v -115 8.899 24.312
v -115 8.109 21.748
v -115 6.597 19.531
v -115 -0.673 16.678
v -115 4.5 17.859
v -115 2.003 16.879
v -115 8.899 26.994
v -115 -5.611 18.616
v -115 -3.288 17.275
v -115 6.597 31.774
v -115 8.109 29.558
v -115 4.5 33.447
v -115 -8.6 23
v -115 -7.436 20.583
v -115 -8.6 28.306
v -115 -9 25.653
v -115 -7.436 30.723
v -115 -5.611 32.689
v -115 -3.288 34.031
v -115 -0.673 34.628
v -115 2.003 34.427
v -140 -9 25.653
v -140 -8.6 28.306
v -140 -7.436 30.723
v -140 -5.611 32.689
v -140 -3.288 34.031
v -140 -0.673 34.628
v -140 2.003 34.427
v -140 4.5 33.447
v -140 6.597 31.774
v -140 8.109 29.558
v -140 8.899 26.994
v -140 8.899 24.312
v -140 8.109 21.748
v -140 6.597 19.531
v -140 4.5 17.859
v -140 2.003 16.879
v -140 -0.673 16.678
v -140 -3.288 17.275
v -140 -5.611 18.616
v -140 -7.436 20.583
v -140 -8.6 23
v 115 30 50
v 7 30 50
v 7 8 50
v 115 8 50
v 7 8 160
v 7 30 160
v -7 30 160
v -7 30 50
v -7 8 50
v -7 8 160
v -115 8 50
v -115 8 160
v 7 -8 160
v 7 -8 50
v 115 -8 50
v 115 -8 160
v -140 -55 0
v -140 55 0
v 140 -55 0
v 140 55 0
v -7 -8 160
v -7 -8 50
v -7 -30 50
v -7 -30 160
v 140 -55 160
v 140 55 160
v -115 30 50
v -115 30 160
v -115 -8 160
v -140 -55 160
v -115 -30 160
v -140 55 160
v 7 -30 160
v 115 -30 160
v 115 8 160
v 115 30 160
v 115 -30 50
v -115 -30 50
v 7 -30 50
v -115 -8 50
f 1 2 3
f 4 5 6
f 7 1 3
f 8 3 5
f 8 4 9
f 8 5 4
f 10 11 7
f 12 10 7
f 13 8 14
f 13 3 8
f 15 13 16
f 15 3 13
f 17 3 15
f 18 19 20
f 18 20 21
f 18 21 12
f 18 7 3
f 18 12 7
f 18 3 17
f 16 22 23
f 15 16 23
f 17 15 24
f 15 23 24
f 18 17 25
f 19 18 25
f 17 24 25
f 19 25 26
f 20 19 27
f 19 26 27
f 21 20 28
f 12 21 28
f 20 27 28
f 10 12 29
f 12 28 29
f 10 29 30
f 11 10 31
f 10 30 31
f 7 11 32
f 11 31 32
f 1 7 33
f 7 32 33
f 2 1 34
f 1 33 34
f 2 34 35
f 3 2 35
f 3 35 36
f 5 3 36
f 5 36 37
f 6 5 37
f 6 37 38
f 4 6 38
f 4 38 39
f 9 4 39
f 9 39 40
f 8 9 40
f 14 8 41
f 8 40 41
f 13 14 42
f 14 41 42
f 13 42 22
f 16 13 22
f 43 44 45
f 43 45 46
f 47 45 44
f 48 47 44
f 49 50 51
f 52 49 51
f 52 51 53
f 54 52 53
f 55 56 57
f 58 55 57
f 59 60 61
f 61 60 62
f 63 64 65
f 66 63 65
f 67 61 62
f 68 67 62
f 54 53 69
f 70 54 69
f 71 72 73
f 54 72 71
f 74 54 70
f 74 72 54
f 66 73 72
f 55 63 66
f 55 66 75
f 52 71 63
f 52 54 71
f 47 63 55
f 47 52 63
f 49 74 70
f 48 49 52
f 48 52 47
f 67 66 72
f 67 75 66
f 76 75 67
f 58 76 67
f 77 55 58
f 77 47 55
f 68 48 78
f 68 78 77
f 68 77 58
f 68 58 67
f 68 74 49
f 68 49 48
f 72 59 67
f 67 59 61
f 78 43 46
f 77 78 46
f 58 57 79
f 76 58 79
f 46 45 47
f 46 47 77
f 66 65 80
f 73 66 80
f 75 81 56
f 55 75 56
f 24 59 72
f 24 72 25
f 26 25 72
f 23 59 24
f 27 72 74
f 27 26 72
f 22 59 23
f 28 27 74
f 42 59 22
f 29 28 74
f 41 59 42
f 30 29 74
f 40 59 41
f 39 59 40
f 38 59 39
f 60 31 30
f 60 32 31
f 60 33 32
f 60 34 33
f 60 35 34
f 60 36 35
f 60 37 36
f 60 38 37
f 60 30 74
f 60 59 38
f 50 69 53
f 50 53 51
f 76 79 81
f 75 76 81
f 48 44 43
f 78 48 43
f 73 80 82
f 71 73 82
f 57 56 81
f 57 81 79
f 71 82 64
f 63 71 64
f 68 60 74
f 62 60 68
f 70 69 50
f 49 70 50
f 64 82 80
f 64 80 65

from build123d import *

# Parameters (mm, degrees)
F0_W     = 280
F0_H     = 110
F1_DEPTH = 160
F2_T     = -10
F3_W     = 260
F3_H     = 90
F3_W_2   = 108
F3_H_2   = 16
F3_W_3   = 14
F4_DEPTH = 150
F5_DEPTH = 40
F6_R     = 9
F7_DEPTH = 25


with BuildPart() as f1:
    # F0 (on Top) → F1 (new body)
    with BuildSketch(Plane.XY):
        Rectangle(F0_W, F0_H)
    extrude(amount=F1_DEPTH)

    # F2
    f2_openings = [f1.faces().sort_by_distance(p)[0] for p in [
        (0, 0, 160),
    ]]
    offset(amount=F2_T, openings=f2_openings)

    # F3 (on face) → F4 (join)
    with BuildSketch(Plane.XY.offset(10)):
        Rectangle(F3_W, F3_H)
        Polygon((115, 30), (115, 24.33777228), (115, 8), (115, -8), (115, -26.8225744367), (115, -30), (7, -30), (-7, -30), (-115, -30), (-115, -8), (-115, 8), (-115, 30), (-15, 30), (-7, 30), (7, 30), align=None, mode=Mode.SUBTRACT)
        with Locations((61, 0)):
            Rectangle(F3_W_2, F3_H_2)
        Polygon((-7, -8), (-7, 8), (-109.6588596702, 8), (-115, 8), (-115, -8), (-109.6588596702, -8), align=None)
        Polygon((-7, 8), (7, 8), (7, 30), (-7, 30), (-7, 15.2422059327), align=None)
        Polygon((7, -16.3514893502), (7, -8), (-7, -8), (-7, -30), (7, -30), align=None)
        Rectangle(F3_W_3, F3_H_2)
    extrude(amount=F4_DEPTH)

    # F3 (on face) → F5 (join)
    with BuildSketch(Plane.XY.offset(10)):
        Rectangle(F3_W, F3_H)
        Polygon((115, 30), (115, 24.33777228), (115, 8), (115, -8), (115, -26.8225744367), (115, -30), (7, -30), (-7, -30), (-115, -30), (-115, -8), (-115, 8), (-115, 30), (-15, 30), (-7, 30), (7, 30), align=None, mode=Mode.SUBTRACT)
        Polygon((115, 8), (115, 24.33777228), (115, 30), (7, 30), (7, 8), align=None)
        Polygon((115, -26.8225744367), (115, -8), (7, -8), (7, -16.3514893502), (7, -30), (115, -30), align=None)
        Polygon((-109.6588596702, 8), (-7, 8), (-7, 15.2422059327), (-7, 30), (-15, 30), (-115, 30), (-115, 8), align=None)
        Polygon((-7, -30), (-7, -8), (-109.6588596702, -8), (-115, -8), (-115, -30), align=None)
        with Locations((61, 0)):
            Rectangle(F3_W_2, F3_H_2)
        Polygon((-7, -8), (-7, 8), (-109.6588596702, 8), (-115, 8), (-115, -8), (-109.6588596702, -8), align=None)
        Rectangle(F3_W_3, F3_H_2)
    extrude(amount=F5_DEPTH)

    # F6 (on face) → F7 (cut)
    with BuildSketch(Plane(origin=(-140, 0, 0), x_dir=(0, -1, 0), z_dir=(-1, 0, 0))):
        with Locations((0, 25.6529357284)):
            Circle(F6_R)
    extrude(amount=-F7_DEPTH, mode=Mode.SUBTRACT)


solid = f1.part
